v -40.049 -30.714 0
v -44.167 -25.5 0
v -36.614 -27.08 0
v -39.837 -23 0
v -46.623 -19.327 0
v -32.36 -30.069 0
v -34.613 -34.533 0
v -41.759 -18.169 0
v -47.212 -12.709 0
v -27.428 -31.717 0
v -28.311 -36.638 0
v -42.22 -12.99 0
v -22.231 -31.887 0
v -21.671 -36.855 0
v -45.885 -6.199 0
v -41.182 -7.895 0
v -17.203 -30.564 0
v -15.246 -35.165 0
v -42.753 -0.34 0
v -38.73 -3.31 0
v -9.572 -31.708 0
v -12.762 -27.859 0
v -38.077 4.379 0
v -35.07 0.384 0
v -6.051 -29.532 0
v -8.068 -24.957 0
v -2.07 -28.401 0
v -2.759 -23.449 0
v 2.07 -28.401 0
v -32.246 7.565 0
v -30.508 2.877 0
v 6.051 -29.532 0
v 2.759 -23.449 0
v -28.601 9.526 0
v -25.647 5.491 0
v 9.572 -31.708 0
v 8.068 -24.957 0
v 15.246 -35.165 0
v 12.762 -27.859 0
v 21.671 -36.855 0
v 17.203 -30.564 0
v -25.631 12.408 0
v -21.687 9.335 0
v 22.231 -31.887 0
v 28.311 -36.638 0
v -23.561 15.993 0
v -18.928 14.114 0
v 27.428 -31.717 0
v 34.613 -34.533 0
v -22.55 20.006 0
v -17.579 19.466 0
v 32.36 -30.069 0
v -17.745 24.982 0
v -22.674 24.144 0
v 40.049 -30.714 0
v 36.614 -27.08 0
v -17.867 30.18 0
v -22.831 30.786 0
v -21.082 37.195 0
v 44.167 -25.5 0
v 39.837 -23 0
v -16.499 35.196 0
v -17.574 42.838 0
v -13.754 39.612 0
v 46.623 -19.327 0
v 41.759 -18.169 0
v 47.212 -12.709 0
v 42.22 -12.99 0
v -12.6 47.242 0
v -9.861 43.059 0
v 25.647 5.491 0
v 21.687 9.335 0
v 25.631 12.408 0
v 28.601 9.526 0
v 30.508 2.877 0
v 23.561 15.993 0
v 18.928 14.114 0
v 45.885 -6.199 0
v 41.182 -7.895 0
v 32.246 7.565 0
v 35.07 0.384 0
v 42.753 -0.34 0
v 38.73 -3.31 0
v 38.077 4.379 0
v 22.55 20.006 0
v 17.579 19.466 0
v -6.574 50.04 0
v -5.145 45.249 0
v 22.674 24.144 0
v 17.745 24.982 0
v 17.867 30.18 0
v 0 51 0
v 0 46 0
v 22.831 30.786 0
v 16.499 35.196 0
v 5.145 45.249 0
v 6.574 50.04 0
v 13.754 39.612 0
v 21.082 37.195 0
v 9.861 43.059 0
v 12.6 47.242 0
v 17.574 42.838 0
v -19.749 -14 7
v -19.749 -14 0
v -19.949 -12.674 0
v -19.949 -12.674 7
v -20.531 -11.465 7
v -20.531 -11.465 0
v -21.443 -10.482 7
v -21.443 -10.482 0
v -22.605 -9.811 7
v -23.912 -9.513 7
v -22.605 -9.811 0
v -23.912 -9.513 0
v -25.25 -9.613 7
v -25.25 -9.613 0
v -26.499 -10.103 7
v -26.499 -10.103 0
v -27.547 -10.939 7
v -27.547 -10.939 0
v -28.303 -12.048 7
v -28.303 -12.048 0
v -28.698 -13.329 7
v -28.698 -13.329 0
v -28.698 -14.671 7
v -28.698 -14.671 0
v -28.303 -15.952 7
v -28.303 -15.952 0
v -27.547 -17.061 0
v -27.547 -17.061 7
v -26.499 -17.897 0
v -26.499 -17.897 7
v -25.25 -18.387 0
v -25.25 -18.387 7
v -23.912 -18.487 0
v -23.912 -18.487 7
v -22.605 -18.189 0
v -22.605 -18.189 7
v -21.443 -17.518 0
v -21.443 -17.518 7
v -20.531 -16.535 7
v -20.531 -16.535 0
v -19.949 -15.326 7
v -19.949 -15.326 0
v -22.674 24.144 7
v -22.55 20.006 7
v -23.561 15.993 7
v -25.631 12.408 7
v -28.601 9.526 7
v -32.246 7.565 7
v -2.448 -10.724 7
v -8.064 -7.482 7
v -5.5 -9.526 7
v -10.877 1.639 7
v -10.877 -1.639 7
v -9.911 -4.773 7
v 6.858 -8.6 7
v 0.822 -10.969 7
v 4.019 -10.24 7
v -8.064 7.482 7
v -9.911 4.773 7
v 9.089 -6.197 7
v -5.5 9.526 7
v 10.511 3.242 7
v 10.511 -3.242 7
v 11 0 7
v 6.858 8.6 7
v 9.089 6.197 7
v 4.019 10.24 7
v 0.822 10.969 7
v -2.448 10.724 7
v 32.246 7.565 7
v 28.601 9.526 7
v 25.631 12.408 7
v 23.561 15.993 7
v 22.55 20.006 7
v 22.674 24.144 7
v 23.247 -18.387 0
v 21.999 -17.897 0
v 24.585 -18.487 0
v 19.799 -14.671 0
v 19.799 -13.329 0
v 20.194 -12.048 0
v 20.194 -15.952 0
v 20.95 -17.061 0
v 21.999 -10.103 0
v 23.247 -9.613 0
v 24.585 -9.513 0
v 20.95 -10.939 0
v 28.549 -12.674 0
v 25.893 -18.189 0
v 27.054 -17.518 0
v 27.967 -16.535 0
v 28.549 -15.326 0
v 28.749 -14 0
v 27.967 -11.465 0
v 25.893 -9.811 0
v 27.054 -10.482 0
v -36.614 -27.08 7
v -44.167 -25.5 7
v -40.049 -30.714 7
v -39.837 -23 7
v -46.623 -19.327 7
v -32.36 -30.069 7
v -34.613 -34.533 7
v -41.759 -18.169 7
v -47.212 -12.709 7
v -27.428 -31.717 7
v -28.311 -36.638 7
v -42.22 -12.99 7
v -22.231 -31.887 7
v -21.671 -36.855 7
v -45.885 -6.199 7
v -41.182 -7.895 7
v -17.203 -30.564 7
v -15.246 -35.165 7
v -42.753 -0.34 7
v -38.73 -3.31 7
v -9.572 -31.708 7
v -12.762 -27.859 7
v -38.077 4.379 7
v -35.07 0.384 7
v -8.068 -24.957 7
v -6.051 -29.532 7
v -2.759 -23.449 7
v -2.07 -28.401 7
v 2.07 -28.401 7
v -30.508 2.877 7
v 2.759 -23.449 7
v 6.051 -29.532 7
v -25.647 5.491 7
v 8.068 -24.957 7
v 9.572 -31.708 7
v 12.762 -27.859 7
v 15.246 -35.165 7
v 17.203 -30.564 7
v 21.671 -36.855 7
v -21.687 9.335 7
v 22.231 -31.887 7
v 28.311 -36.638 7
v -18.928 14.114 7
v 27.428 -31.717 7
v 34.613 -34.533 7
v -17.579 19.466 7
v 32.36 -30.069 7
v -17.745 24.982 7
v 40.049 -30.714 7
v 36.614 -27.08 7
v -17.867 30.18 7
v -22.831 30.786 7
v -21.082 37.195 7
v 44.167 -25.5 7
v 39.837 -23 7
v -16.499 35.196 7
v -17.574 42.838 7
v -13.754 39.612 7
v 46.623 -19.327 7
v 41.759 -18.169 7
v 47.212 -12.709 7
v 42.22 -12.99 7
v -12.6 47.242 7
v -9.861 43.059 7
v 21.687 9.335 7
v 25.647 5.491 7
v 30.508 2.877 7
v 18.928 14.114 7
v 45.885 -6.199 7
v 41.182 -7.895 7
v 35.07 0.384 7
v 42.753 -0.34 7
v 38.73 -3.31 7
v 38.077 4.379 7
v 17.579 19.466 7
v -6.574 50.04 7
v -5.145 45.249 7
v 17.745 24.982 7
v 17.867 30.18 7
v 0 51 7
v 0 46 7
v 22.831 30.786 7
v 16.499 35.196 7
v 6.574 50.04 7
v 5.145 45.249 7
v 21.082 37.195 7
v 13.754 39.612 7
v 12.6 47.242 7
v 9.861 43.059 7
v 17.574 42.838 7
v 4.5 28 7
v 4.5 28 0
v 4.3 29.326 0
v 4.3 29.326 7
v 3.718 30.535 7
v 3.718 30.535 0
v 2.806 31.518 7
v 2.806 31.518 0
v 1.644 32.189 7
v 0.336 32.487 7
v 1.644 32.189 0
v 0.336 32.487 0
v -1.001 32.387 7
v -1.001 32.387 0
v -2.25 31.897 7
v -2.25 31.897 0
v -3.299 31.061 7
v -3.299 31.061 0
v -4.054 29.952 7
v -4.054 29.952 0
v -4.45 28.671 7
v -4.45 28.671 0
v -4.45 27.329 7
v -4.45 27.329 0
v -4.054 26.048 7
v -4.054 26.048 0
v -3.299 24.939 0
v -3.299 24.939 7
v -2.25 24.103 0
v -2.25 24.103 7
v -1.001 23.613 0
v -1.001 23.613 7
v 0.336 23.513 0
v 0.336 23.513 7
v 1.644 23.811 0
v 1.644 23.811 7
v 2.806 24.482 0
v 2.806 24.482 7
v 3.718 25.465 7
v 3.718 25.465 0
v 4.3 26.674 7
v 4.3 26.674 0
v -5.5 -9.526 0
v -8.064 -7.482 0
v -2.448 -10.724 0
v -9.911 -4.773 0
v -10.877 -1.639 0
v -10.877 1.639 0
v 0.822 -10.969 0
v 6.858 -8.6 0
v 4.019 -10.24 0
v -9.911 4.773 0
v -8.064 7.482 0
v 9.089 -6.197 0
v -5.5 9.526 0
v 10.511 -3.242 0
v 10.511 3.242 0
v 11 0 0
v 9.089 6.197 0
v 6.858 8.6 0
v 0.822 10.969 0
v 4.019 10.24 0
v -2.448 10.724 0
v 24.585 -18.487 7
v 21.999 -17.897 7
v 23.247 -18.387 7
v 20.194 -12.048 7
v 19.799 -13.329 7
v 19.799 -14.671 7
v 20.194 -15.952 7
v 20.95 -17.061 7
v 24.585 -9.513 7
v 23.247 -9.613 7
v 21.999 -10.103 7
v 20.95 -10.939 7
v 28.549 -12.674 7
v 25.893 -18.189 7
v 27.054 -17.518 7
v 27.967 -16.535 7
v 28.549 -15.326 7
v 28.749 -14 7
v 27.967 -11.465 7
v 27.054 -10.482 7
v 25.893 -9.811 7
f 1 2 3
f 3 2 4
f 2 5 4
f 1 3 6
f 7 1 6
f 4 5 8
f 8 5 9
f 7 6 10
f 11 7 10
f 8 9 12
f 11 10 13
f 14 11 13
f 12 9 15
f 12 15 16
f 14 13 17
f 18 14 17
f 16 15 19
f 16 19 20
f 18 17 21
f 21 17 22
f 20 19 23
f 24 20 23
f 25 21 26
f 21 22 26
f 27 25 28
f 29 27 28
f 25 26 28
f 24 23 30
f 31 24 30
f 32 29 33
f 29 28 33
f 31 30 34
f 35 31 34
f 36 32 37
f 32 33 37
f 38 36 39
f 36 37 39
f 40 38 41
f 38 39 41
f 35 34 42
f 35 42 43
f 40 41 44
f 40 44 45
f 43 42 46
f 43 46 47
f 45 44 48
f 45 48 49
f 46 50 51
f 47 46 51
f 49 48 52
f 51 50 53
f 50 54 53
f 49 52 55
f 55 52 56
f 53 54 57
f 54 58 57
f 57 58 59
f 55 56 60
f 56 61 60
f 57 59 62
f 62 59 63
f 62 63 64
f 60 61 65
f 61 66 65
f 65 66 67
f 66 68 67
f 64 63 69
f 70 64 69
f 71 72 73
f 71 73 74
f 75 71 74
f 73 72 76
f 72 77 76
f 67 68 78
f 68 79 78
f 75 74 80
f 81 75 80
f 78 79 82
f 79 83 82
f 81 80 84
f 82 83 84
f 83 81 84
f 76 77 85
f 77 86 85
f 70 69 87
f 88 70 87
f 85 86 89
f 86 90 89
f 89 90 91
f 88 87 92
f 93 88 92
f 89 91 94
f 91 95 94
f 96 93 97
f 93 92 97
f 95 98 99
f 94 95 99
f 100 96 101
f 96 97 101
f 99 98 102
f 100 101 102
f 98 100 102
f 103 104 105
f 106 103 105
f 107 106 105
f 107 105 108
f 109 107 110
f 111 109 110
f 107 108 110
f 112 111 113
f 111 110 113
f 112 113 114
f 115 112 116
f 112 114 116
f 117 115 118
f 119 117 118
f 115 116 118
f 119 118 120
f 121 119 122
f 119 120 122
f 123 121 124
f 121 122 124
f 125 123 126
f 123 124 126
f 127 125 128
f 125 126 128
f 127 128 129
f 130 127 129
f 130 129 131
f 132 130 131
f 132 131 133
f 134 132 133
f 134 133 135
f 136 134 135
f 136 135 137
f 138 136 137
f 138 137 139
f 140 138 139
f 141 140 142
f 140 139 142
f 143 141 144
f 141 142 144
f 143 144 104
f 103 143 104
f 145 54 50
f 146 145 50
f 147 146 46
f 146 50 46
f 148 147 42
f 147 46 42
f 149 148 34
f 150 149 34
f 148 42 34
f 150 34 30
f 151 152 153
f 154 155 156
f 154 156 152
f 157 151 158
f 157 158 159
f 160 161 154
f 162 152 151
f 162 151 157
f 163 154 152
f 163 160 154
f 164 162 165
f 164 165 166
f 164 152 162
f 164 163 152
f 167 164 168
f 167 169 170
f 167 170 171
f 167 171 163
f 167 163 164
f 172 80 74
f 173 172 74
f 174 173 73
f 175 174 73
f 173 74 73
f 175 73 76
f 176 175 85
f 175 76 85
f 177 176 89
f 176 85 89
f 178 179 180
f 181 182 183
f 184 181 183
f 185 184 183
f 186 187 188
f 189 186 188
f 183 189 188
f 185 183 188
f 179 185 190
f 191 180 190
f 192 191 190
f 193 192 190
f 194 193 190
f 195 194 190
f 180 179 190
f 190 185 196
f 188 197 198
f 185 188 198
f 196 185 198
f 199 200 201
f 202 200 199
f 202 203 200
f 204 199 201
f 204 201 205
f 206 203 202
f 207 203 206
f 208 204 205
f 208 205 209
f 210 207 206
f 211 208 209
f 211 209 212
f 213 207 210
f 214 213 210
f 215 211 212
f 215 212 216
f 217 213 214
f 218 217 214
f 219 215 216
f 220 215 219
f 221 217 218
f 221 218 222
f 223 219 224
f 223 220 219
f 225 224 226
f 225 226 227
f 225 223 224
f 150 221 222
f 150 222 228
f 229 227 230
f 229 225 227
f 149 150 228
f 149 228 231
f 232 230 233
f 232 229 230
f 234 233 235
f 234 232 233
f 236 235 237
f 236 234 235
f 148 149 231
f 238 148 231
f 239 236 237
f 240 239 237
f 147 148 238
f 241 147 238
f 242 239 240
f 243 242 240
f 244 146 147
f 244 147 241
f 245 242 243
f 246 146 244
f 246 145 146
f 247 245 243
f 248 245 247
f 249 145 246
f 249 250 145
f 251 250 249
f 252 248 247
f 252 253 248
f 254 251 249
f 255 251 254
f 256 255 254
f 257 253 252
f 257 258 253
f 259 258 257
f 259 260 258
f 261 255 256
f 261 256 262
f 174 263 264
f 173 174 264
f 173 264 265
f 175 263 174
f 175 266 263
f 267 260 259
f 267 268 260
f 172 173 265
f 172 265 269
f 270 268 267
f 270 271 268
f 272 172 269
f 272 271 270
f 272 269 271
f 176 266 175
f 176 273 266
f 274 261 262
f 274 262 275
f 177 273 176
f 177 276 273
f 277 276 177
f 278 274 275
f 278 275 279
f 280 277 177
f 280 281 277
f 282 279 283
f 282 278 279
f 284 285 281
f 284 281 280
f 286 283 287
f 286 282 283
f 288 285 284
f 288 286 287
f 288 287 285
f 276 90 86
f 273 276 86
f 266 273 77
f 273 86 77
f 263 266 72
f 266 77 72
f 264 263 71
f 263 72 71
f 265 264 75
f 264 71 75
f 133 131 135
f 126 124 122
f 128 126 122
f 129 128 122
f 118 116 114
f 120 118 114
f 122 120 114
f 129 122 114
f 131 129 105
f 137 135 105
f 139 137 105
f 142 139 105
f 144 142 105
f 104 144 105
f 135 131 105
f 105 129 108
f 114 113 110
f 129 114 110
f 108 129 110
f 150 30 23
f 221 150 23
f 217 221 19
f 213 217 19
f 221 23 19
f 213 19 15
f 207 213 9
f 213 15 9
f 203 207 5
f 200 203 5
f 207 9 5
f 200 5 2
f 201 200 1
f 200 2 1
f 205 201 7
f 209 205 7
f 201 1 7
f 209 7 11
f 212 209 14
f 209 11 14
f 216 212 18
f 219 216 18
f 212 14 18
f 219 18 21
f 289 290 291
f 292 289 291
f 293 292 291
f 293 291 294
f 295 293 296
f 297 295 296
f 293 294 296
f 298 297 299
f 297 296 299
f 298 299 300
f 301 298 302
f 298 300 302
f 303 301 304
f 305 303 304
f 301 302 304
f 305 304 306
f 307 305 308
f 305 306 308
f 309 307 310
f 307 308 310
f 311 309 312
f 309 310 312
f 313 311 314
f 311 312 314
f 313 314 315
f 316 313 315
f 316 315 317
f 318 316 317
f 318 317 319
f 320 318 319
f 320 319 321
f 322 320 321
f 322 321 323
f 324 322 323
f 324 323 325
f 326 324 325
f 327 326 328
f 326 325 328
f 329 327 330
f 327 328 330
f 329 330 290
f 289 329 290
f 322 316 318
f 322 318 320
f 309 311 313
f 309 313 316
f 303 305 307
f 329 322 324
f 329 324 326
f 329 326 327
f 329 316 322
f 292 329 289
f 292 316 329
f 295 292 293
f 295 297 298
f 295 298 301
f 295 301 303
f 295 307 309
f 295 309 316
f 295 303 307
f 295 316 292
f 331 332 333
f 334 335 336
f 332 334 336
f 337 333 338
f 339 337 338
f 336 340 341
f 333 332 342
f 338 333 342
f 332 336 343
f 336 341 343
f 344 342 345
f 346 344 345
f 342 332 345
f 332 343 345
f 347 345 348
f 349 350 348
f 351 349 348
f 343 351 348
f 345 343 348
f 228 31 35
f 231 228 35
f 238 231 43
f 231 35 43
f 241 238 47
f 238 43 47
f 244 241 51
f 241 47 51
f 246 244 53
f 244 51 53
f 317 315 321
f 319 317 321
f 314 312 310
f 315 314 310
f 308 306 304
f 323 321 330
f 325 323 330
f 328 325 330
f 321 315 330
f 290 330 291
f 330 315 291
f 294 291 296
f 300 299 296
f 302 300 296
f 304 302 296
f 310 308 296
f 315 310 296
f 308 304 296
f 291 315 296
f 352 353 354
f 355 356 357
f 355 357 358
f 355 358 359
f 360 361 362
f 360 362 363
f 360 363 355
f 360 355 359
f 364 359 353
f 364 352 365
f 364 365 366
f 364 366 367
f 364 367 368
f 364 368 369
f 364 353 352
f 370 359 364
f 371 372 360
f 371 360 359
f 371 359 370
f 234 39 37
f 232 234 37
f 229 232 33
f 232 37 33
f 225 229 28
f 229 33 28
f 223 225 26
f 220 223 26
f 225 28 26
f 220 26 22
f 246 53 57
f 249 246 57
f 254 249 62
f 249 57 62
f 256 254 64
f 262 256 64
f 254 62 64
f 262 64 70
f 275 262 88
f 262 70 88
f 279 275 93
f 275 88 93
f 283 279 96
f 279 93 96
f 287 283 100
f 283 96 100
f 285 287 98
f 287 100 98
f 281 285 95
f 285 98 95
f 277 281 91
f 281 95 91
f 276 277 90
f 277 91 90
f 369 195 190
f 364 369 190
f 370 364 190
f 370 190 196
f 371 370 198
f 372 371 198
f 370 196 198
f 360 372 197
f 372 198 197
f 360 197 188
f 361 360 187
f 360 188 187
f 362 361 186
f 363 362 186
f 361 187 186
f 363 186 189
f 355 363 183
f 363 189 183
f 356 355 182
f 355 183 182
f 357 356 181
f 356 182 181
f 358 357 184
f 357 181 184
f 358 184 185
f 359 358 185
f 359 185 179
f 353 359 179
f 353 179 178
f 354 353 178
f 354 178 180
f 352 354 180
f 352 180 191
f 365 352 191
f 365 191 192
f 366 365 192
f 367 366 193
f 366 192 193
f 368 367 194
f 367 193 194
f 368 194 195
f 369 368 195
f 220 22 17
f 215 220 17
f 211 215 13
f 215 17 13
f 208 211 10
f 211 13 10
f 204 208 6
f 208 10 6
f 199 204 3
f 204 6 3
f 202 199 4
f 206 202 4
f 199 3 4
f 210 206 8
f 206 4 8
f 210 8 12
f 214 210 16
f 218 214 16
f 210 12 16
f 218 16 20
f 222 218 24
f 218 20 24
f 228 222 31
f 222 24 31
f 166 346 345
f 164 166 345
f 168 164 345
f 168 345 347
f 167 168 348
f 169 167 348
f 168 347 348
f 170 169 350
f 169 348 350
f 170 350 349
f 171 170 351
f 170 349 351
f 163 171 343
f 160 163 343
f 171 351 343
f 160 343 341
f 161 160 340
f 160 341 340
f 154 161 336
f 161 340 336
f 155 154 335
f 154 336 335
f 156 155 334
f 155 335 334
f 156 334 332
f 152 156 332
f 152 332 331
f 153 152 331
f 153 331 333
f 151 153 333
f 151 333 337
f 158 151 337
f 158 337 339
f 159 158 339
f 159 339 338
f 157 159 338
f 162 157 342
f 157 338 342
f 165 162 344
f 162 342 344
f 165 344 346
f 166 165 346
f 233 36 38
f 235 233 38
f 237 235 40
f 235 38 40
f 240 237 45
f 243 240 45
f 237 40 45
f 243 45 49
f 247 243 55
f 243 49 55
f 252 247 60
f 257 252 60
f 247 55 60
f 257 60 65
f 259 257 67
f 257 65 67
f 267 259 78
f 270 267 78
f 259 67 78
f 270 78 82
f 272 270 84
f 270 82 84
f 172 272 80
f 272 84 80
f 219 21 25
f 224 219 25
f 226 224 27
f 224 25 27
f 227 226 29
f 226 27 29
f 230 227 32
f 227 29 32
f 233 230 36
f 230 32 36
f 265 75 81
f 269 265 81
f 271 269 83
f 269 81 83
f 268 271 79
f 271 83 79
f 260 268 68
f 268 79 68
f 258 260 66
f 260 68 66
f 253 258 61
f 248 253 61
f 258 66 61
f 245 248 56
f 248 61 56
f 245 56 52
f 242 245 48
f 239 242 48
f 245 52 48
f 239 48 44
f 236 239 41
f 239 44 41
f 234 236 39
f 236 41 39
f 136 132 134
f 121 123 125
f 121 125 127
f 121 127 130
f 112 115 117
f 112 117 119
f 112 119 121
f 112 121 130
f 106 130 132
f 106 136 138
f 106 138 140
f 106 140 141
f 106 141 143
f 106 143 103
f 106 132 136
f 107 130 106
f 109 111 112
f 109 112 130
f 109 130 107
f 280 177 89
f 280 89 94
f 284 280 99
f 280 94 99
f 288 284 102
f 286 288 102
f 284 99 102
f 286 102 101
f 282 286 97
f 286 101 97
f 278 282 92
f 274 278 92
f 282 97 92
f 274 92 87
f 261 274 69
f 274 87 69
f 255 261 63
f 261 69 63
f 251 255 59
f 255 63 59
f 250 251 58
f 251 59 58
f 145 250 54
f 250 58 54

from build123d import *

# Parameters (mm, degrees)
F1_DEPTH = 7
F0_R     = 11
F0_R_2   = 4.5


# Not quite as in the source:
# - ends of sketch curves that miss each other by under 0.0002 mm in the source are joined


with BuildPart() as f1:
    # F0 (on Top) → F1 (new body)
    with BuildSketch(Plane.XY):
        with BuildLine():
            ThreePointArc((32.2462730801, 7.5647624351), (24.4716930106, 14.1287385472), (22.6744129825, 24.1437104471))
            ThreePointArc((22.6744129825, 24.1437104471), (0, 51), (-22.6744135565, 24.1437103495))
            ThreePointArc((-22.6744135565, 24.1437103495), (-24.4716930106, 14.1287385472), (-32.2462730801, 7.5647624351))
            ThreePointArc((-32.2462730801, 7.5647624351), (-44.167295593, -25.5), (-9.571859726, -31.7084733306))
            ThreePointArc((-9.571859726, -31.7084733306), (0, -28.2574780285), (9.5718595015, -31.7084736015))
            ThreePointArc((9.5718595015, -31.7084736015), (44.167295593, -25.5), (32.2462730801, 7.5647624351))
        make_face()
        with BuildLine():
            ThreePointArc((-12.7624796347, -27.8588052153), (-39.8371685741, -23), (-30.5076728529, 2.8767710287))
            ThreePointArc((-30.5076728529, 2.8767710287), (-20.1415664959, 11.6287388383), (-17.7451932181, 24.9820341866))
            ThreePointArc((-17.7451932181, 24.9820341866), (0, 46), (17.7451932181, 24.9820341866))
            ThreePointArc((17.7451932181, 24.9820341866), (20.1415664959, 11.6287388383), (30.5076728529, 2.8767710287))
            ThreePointArc((30.5076728529, 2.8767710287), (39.8371685741, -23), (12.7624796347, -27.8588052153))
            ThreePointArc((12.7624796347, -27.8588052153), (0, -23.2574776767), (-12.7624796347, -27.8588052153))
        make_face(mode=Mode.SUBTRACT)
    extrude(amount=F1_DEPTH)


with BuildPart() as f1b:
    # F0 (on Top) → F1, piece 2 (new body)
    with BuildSketch(Plane.XY):
        Circle(F0_R)
    extrude(amount=F1_DEPTH)


with BuildPart() as f1c:
    # F0 (on Top) → F1, piece 3 (new body)
    with BuildSketch(Plane.XY):
        with Locations((-24.248711306, -14)):
            Circle(F0_R_2)
    extrude(amount=F1_DEPTH)


with BuildPart() as f1d:
    # F0 (on Top) → F1, piece 4 (new body)
    with BuildSketch(Plane.XY):
        with Locations((24.248711306, -14)):
            Circle(F0_R_2)
    extrude(amount=F1_DEPTH)


with BuildPart() as f1e:
    # F0 (on Top) → F1, piece 5 (new body)
    with BuildSketch(Plane.XY):
        with Locations((0, 28)):
            Circle(F0_R_2)
    extrude(amount=F1_DEPTH)


solid = Compound([f1.part, f1b.part, f1c.part, f1d.part, f1e.part])
